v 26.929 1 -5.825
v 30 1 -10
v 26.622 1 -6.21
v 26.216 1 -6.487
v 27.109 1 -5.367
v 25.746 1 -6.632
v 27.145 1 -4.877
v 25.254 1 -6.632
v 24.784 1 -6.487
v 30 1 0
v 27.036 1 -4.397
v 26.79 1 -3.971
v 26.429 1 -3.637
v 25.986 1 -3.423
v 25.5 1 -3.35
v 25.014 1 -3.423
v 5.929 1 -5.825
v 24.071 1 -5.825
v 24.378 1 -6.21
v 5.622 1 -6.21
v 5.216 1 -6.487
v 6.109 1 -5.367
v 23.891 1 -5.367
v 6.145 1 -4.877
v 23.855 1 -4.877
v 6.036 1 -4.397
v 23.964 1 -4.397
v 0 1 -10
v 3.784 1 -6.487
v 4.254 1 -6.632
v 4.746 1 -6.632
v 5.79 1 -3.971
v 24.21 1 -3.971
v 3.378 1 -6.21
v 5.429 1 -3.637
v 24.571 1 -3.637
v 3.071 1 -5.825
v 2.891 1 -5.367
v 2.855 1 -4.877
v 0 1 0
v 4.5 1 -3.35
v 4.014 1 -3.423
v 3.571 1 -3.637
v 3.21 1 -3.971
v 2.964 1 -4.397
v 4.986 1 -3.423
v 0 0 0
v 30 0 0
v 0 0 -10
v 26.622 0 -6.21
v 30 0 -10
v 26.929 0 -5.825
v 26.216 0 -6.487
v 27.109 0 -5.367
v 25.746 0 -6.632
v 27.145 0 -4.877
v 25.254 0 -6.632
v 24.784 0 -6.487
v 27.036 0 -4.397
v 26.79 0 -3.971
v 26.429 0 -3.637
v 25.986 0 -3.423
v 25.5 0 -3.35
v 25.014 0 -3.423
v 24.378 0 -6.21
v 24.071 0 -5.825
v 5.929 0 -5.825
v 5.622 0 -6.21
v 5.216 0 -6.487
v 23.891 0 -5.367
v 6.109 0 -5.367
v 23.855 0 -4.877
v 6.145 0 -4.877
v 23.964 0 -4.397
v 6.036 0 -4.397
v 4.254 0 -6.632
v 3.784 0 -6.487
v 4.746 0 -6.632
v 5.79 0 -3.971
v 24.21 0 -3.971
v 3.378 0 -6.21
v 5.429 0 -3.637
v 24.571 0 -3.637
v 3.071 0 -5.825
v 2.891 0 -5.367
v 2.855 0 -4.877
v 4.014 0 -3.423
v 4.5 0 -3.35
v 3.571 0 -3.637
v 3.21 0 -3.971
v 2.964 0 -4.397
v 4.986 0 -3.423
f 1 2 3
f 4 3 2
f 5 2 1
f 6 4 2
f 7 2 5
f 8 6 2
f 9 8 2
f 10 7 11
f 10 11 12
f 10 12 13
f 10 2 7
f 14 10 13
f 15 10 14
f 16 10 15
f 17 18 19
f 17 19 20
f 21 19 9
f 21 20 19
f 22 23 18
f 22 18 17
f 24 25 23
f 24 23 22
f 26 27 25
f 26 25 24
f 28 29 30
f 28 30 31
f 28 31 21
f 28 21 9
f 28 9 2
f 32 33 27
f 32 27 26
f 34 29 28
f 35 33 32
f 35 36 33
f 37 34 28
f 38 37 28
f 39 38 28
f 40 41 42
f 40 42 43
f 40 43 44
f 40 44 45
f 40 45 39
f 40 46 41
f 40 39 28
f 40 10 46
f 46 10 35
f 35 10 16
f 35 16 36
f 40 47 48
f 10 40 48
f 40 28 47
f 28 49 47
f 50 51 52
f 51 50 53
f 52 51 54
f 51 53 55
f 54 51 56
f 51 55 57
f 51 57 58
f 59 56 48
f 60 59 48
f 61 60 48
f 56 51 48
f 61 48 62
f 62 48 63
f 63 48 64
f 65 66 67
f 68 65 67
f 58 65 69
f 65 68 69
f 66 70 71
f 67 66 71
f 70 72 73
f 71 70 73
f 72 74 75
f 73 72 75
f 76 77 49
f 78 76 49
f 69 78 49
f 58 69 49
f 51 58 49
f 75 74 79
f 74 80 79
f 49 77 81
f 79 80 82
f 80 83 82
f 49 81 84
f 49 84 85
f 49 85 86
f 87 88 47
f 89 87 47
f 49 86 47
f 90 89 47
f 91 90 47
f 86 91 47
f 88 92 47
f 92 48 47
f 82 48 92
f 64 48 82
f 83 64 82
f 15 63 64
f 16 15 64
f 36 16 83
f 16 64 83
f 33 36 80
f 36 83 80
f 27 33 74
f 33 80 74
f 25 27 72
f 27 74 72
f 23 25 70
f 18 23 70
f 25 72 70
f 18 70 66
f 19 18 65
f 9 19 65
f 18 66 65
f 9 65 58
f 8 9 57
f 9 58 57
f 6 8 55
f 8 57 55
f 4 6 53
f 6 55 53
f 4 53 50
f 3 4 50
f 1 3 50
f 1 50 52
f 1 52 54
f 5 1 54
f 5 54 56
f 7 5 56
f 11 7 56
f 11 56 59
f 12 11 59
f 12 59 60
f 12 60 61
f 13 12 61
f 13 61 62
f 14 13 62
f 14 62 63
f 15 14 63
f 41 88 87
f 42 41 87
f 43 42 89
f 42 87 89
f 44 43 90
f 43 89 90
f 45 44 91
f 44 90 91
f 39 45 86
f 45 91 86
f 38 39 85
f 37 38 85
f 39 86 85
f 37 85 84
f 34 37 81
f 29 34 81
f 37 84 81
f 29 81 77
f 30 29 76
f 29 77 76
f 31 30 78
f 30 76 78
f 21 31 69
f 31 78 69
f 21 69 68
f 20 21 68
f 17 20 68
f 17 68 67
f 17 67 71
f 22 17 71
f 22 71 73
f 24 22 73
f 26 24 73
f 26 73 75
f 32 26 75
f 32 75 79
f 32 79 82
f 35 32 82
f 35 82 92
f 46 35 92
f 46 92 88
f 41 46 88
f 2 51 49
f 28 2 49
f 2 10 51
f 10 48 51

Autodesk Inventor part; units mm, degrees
ref_plane "YZ Plane" through (0, 0, 0) normal (1, 0, 0) x (0, 1, 0)
ref_plane "XZ Plane" through (0, 0, 0) normal (0, 1, 0) x (-1, 0, 0)
ref_plane "XY Plane" through (0, 0, 0) normal (0, 0, 1) x (1, 0, 0)
sketch "スケッチ1" plane through (0, 0, 0) normal (0, 1, 0) x (-1, 0, 0)
  line L0 (0, 0) -> (-30, 0)
  line L1 (-30, 0) -> (-30, -10)
  line L2 (-30, -10) -> (0, -10)
  line L3 (0, -10) -> (0, 0)
  dimension "d0" = 30
  dimension "d1" = 10
extrude "押し出し1" add sketch "スケッチ1" along normal blind 1
sketch "スケッチ2" plane through (0, 1, 0) normal (0, 1, 0) x (1, 0, 0)
  line L0 (0, 10) -> (0, 0) construction
  line L1 (0, 5) -> (30, 5) construction
  line L2 (30, 0) -> (30, 10) construction
  point P0 (4.5, 5)
  point P1 (25.5, 5)
  dimension "d4" = 21
  dimension "d5" = 4.5
hole "穴1" at (4.5, 1, -5) at (25.5, 1, -5) direction (0, -1, 0) diameter 3.3 depth 2 tip angle 118
properties part number "elbow_encorder_spacer"
